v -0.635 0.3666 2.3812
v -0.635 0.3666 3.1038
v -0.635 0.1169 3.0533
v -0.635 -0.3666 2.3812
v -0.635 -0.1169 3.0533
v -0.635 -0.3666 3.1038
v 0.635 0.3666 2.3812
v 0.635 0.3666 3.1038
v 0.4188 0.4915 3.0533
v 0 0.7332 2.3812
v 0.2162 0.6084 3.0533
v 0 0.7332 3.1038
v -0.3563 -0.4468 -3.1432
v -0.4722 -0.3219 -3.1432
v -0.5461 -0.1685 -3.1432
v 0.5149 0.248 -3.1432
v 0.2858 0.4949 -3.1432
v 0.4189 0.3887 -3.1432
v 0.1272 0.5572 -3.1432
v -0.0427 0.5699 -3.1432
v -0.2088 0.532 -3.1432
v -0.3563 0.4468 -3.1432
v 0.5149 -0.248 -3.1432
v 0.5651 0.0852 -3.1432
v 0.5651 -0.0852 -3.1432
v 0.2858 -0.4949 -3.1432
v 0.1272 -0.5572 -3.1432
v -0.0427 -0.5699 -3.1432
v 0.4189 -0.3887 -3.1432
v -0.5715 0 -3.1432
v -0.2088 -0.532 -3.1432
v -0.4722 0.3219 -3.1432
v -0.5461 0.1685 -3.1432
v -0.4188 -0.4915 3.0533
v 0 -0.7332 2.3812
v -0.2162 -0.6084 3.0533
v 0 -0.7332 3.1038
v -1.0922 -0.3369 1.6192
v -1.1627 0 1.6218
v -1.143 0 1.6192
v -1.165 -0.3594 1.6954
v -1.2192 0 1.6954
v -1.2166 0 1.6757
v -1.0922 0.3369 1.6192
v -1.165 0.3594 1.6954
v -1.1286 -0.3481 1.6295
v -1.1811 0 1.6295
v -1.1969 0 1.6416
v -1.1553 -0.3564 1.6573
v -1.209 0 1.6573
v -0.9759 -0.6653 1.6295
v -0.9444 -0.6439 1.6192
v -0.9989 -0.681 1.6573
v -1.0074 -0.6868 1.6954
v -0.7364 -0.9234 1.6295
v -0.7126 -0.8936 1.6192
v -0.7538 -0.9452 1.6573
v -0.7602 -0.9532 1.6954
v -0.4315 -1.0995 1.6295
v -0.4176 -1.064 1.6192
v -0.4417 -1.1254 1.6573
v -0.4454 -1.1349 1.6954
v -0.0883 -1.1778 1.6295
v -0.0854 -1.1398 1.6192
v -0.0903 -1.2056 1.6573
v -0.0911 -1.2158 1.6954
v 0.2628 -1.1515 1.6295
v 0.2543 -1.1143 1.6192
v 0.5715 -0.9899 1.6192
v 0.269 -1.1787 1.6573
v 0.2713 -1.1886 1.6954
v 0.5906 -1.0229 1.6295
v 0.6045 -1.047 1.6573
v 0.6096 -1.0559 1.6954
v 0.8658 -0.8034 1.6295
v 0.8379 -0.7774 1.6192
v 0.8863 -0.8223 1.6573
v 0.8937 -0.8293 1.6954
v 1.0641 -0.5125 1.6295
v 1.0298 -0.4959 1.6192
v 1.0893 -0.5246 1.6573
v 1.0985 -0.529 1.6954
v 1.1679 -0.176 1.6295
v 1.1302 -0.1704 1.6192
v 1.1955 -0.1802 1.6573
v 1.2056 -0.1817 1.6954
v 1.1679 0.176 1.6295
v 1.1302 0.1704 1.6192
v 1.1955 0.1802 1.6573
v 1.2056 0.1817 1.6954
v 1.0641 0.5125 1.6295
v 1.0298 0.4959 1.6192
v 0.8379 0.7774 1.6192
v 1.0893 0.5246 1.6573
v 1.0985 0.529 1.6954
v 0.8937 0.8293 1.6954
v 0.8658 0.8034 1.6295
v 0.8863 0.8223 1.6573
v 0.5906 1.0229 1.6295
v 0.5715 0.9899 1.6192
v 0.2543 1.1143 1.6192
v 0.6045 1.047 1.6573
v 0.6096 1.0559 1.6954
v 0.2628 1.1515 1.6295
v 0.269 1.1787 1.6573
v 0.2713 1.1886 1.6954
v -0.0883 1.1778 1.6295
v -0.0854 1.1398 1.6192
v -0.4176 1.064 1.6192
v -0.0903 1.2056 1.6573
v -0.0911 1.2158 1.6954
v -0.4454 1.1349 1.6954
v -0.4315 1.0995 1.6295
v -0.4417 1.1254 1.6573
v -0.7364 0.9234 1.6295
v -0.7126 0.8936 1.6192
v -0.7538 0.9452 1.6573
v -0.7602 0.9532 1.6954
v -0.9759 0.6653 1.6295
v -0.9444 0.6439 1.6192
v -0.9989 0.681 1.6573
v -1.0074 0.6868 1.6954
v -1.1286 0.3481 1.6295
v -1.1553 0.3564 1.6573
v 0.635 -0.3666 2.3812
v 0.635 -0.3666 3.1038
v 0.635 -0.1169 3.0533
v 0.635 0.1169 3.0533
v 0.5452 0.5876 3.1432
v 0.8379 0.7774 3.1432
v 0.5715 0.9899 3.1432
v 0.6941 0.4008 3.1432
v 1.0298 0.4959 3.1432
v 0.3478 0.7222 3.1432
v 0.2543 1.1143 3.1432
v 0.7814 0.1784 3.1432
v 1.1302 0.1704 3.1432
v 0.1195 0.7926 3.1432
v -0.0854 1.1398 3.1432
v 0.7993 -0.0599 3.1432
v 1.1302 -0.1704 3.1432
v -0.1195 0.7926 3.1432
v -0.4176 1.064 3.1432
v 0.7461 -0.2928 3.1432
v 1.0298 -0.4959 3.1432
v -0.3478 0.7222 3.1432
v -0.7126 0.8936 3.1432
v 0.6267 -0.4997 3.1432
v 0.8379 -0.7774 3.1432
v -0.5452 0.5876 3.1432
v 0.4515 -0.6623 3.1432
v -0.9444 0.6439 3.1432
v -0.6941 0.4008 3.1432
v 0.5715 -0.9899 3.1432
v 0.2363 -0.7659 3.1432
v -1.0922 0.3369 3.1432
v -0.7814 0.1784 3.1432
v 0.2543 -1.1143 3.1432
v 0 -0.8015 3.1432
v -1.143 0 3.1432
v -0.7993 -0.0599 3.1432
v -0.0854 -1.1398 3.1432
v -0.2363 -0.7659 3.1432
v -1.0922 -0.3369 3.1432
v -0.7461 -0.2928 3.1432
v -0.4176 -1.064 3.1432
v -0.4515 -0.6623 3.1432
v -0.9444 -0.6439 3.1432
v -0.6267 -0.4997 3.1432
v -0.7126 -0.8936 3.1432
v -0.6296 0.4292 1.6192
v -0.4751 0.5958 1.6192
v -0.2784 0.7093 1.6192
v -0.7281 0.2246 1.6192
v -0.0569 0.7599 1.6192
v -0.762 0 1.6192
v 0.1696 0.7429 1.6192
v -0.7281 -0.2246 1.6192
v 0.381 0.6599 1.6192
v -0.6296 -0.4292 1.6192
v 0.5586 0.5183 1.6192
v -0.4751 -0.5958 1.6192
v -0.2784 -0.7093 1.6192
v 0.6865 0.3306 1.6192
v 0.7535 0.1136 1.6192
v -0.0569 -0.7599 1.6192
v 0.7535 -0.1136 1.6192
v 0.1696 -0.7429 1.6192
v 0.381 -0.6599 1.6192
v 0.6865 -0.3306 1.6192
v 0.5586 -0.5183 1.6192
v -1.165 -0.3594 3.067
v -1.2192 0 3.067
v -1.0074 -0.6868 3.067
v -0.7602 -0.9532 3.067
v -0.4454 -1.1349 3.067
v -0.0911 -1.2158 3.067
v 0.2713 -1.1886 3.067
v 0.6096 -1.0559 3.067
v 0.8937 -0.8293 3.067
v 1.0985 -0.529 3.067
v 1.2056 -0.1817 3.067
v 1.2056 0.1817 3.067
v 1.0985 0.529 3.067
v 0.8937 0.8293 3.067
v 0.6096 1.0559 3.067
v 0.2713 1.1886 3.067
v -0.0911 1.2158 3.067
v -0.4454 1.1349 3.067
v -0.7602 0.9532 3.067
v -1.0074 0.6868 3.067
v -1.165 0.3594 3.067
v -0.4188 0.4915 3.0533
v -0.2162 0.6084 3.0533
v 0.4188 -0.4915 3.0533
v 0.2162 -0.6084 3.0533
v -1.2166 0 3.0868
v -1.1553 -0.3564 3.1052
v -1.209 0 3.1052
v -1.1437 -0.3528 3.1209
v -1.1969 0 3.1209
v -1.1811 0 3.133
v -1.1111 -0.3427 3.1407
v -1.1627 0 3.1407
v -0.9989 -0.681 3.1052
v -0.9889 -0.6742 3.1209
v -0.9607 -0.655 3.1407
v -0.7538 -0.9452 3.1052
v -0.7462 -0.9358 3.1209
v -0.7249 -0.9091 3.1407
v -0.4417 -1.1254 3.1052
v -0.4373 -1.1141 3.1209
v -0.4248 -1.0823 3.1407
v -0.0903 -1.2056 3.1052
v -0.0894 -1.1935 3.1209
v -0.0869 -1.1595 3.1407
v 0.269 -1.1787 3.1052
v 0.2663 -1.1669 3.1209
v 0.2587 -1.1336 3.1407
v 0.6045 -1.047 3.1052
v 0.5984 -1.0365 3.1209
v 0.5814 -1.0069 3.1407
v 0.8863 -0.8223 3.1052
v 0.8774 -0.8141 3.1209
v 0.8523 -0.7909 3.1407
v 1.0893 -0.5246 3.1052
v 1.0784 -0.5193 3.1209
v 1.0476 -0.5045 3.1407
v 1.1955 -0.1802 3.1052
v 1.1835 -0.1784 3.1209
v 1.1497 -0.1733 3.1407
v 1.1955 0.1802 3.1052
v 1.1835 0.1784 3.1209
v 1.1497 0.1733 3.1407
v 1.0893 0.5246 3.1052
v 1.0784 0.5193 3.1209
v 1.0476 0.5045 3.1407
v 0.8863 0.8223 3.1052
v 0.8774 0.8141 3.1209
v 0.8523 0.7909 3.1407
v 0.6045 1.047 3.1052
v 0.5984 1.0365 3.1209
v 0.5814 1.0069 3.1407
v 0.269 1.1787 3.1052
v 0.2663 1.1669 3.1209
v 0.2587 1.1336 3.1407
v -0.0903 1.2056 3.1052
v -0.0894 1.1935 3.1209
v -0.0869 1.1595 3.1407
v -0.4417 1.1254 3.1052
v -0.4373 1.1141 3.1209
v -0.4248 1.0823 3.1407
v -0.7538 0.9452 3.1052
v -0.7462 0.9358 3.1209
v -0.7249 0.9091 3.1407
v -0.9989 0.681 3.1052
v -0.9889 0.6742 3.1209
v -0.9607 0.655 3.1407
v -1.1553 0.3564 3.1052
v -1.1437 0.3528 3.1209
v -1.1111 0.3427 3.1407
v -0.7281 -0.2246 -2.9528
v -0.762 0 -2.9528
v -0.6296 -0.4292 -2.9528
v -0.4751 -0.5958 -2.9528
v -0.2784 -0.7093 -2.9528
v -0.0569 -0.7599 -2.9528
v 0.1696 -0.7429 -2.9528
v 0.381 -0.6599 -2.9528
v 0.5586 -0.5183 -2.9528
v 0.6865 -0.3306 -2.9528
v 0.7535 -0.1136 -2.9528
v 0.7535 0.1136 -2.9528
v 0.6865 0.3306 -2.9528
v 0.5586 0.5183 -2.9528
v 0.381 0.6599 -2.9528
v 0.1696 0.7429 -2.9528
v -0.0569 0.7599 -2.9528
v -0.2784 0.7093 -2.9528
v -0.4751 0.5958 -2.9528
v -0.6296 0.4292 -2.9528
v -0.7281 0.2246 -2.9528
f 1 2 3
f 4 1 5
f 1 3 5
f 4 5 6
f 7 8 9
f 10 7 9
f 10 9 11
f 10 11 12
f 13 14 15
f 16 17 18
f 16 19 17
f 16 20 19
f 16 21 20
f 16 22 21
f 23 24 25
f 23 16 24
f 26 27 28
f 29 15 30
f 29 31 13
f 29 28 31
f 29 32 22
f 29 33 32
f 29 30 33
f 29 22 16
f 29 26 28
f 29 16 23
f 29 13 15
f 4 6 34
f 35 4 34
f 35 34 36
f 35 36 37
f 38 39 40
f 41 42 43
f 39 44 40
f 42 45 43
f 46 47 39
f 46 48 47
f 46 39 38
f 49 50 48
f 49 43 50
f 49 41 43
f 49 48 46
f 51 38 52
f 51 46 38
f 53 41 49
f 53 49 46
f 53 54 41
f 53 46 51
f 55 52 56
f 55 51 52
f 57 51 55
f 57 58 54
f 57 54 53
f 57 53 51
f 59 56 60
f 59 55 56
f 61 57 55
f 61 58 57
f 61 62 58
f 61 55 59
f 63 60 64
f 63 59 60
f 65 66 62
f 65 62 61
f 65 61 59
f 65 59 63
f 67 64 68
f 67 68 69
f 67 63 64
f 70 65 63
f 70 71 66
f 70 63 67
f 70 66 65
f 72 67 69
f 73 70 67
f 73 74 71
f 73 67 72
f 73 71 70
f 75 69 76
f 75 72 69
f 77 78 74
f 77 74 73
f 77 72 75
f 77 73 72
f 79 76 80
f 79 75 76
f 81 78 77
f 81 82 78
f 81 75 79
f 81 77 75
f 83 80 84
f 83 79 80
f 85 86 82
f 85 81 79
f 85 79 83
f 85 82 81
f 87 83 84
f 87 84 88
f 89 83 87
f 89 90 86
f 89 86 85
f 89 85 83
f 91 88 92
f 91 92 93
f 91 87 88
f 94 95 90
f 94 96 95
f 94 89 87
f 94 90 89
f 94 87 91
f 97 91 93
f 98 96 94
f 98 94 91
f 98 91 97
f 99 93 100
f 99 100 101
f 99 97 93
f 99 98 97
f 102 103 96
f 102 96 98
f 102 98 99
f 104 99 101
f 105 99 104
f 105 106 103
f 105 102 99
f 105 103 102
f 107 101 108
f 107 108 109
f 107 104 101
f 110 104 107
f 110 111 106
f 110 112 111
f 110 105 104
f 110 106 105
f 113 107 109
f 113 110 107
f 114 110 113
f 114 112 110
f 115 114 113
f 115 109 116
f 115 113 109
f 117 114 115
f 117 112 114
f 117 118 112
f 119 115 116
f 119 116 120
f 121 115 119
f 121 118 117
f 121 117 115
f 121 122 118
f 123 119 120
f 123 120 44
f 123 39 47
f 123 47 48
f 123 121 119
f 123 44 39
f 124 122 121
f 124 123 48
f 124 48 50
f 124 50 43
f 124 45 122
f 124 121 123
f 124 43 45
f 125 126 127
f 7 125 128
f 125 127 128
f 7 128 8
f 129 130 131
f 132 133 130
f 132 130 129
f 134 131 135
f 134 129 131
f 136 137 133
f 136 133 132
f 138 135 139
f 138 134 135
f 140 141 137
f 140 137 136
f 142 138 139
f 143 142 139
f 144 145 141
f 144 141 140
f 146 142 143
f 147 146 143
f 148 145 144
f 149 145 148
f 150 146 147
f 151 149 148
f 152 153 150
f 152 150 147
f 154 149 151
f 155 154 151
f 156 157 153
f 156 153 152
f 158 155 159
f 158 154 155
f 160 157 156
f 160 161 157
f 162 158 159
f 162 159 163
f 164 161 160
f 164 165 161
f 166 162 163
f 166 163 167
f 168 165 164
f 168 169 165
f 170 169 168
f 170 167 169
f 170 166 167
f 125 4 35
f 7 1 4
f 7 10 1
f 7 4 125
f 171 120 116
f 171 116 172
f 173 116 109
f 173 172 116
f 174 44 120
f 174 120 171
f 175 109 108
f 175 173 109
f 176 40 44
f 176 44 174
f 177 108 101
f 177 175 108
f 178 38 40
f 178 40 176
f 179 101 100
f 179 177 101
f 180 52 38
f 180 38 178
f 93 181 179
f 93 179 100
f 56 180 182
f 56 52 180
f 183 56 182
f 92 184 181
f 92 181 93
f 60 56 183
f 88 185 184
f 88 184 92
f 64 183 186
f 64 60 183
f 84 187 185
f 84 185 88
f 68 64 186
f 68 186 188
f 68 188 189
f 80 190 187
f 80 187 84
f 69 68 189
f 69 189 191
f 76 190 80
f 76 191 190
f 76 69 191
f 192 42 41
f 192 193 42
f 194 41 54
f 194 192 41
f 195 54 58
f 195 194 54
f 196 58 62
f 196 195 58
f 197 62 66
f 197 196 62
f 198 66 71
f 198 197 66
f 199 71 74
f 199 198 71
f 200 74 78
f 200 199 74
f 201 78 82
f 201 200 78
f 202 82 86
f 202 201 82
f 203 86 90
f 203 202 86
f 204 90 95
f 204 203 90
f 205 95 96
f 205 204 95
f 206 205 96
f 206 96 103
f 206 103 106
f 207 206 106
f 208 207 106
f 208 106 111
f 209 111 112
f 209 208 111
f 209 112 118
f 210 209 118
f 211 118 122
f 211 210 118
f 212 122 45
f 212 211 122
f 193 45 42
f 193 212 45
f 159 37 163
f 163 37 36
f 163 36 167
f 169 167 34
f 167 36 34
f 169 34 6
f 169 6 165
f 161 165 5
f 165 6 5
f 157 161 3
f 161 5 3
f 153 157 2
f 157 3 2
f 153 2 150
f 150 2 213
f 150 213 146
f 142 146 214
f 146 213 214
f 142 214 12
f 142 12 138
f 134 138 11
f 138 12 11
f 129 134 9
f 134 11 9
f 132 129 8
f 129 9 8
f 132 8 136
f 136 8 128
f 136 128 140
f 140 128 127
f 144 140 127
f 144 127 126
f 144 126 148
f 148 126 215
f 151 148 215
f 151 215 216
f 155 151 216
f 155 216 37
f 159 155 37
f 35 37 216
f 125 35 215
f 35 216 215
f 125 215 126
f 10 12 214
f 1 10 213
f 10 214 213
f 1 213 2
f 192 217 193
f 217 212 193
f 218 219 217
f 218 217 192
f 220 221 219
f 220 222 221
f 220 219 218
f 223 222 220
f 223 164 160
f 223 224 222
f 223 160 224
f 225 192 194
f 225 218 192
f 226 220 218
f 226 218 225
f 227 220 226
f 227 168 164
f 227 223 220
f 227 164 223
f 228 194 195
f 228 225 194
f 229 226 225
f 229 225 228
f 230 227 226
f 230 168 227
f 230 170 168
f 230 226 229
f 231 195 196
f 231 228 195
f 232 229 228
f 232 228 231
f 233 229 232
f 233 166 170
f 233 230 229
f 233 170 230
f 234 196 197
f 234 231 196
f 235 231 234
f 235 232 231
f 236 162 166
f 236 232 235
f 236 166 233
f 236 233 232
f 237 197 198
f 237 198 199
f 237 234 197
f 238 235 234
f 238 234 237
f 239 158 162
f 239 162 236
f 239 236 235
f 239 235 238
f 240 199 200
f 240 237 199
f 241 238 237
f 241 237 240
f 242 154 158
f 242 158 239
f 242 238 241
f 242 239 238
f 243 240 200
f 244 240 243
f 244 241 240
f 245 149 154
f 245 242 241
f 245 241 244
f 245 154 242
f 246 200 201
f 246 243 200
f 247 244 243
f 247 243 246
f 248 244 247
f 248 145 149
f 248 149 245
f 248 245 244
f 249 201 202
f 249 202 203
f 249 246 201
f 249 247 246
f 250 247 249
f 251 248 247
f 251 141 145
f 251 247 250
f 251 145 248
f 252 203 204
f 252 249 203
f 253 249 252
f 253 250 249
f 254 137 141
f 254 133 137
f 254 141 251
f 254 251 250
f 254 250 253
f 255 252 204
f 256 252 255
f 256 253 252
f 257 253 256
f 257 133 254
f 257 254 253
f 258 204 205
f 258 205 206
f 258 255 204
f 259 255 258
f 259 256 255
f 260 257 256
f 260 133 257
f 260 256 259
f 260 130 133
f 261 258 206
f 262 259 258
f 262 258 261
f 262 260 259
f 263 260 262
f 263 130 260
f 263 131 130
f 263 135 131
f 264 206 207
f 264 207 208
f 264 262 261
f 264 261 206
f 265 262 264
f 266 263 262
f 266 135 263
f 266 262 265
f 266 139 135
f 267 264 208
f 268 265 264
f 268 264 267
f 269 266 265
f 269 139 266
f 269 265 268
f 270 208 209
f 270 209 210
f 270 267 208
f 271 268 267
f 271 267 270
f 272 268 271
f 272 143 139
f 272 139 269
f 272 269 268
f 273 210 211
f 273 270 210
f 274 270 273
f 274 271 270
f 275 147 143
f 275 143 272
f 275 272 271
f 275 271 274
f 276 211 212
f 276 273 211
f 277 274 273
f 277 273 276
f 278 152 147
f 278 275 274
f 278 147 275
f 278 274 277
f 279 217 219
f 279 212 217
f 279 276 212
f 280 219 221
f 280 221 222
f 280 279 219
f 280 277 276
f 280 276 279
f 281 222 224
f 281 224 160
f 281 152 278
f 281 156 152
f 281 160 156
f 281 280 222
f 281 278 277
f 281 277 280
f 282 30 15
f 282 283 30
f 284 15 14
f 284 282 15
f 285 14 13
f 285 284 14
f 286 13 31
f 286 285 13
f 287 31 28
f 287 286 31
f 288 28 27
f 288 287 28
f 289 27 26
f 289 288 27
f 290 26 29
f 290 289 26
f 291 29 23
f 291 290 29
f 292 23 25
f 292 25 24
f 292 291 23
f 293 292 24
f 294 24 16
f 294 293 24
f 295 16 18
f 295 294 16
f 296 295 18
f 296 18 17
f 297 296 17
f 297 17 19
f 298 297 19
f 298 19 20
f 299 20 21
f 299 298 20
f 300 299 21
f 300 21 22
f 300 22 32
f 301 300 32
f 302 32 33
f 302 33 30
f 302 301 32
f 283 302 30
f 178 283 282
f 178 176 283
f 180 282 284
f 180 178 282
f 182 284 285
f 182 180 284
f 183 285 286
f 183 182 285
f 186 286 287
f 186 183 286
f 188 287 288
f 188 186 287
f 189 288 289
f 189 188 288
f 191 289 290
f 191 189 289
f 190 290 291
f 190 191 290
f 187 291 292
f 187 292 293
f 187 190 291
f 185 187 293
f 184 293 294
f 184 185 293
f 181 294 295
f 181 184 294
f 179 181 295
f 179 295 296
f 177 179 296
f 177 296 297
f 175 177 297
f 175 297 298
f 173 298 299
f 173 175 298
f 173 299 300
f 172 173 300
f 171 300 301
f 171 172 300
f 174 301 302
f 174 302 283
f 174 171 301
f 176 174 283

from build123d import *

# Parameters (mm, degrees)
CUT_EXTRUDE1_START = 3.14325
CUT_EXTRUDE1_DEPTH = 0.762


with BuildPart() as part:
    # Sketch2 → Revolve1 (revolve)
    with BuildSketch(Plane(origin=(0, 0, 0), x_dir=(0, 0, -1), z_dir=(1, 0, 0)), mode=Mode.PRIVATE) as revolve1_sk:
        with BuildLine():
            Line((3.14325, 0), (3.14325, 0.5715))
            Line((3.14325, 0.5715), (2.95275, 0.762))
            Line((2.95275, 0.762), (-1.61925, 0.762))
            Line((-1.61925, 0.762), (-1.61925, 1.143))
            ThreePointArc((-1.61925, 1.143), (-1.641568463, 1.196881537), (-1.69545, 1.2192))
            Line((-1.69545, 1.2192), (-3.06705, 1.2192))
            ThreePointArc((-3.06705, 1.2192), (-3.120931537, 1.196881537), (-3.14325, 1.143))
            Line((-3.14325, 1.143), (-3.14325, 0))
            Line((-3.14325, 0), (3.14325, 0))
        make_face()
    revolve(revolve1_sk.sketch.rotate(Axis((0, 0, -3.14325), (0, 0, 1)), 90), axis=Axis((0, 0, -3.14325), (0, 0, 1)))

    # Sketch3 → Cut-Extrude1 (cut)
    with BuildSketch(Plane.XY.offset(CUT_EXTRUDE1_START)):
        Polygon((-0.635, 0.366617421), (-0.635, -0.366617421), (0, -0.733234842), (0.635, -0.366617421), (0.635, 0.366617421), (0, 0.733234842), align=None)
    extrude(amount=-CUT_EXTRUDE1_DEPTH, mode=Mode.SUBTRACT)

    # Cut-Extrude2 cone 1 section (through the dimple's axis) → Cut-Extrude2 (revolve, cut)
    with BuildSketch(Plane(origin=(0, 0, 3.14325), x_dir=(0, -1, 0), z_dir=(1, 0, 0))):
        Polygon((0, 0), (0.801529035, 0), (0, 0.462763004), align=None)
    revolve(axis=Axis((0, 0, 3.14325), (0, 0, -1)), mode=Mode.SUBTRACT)


solid = part.part
